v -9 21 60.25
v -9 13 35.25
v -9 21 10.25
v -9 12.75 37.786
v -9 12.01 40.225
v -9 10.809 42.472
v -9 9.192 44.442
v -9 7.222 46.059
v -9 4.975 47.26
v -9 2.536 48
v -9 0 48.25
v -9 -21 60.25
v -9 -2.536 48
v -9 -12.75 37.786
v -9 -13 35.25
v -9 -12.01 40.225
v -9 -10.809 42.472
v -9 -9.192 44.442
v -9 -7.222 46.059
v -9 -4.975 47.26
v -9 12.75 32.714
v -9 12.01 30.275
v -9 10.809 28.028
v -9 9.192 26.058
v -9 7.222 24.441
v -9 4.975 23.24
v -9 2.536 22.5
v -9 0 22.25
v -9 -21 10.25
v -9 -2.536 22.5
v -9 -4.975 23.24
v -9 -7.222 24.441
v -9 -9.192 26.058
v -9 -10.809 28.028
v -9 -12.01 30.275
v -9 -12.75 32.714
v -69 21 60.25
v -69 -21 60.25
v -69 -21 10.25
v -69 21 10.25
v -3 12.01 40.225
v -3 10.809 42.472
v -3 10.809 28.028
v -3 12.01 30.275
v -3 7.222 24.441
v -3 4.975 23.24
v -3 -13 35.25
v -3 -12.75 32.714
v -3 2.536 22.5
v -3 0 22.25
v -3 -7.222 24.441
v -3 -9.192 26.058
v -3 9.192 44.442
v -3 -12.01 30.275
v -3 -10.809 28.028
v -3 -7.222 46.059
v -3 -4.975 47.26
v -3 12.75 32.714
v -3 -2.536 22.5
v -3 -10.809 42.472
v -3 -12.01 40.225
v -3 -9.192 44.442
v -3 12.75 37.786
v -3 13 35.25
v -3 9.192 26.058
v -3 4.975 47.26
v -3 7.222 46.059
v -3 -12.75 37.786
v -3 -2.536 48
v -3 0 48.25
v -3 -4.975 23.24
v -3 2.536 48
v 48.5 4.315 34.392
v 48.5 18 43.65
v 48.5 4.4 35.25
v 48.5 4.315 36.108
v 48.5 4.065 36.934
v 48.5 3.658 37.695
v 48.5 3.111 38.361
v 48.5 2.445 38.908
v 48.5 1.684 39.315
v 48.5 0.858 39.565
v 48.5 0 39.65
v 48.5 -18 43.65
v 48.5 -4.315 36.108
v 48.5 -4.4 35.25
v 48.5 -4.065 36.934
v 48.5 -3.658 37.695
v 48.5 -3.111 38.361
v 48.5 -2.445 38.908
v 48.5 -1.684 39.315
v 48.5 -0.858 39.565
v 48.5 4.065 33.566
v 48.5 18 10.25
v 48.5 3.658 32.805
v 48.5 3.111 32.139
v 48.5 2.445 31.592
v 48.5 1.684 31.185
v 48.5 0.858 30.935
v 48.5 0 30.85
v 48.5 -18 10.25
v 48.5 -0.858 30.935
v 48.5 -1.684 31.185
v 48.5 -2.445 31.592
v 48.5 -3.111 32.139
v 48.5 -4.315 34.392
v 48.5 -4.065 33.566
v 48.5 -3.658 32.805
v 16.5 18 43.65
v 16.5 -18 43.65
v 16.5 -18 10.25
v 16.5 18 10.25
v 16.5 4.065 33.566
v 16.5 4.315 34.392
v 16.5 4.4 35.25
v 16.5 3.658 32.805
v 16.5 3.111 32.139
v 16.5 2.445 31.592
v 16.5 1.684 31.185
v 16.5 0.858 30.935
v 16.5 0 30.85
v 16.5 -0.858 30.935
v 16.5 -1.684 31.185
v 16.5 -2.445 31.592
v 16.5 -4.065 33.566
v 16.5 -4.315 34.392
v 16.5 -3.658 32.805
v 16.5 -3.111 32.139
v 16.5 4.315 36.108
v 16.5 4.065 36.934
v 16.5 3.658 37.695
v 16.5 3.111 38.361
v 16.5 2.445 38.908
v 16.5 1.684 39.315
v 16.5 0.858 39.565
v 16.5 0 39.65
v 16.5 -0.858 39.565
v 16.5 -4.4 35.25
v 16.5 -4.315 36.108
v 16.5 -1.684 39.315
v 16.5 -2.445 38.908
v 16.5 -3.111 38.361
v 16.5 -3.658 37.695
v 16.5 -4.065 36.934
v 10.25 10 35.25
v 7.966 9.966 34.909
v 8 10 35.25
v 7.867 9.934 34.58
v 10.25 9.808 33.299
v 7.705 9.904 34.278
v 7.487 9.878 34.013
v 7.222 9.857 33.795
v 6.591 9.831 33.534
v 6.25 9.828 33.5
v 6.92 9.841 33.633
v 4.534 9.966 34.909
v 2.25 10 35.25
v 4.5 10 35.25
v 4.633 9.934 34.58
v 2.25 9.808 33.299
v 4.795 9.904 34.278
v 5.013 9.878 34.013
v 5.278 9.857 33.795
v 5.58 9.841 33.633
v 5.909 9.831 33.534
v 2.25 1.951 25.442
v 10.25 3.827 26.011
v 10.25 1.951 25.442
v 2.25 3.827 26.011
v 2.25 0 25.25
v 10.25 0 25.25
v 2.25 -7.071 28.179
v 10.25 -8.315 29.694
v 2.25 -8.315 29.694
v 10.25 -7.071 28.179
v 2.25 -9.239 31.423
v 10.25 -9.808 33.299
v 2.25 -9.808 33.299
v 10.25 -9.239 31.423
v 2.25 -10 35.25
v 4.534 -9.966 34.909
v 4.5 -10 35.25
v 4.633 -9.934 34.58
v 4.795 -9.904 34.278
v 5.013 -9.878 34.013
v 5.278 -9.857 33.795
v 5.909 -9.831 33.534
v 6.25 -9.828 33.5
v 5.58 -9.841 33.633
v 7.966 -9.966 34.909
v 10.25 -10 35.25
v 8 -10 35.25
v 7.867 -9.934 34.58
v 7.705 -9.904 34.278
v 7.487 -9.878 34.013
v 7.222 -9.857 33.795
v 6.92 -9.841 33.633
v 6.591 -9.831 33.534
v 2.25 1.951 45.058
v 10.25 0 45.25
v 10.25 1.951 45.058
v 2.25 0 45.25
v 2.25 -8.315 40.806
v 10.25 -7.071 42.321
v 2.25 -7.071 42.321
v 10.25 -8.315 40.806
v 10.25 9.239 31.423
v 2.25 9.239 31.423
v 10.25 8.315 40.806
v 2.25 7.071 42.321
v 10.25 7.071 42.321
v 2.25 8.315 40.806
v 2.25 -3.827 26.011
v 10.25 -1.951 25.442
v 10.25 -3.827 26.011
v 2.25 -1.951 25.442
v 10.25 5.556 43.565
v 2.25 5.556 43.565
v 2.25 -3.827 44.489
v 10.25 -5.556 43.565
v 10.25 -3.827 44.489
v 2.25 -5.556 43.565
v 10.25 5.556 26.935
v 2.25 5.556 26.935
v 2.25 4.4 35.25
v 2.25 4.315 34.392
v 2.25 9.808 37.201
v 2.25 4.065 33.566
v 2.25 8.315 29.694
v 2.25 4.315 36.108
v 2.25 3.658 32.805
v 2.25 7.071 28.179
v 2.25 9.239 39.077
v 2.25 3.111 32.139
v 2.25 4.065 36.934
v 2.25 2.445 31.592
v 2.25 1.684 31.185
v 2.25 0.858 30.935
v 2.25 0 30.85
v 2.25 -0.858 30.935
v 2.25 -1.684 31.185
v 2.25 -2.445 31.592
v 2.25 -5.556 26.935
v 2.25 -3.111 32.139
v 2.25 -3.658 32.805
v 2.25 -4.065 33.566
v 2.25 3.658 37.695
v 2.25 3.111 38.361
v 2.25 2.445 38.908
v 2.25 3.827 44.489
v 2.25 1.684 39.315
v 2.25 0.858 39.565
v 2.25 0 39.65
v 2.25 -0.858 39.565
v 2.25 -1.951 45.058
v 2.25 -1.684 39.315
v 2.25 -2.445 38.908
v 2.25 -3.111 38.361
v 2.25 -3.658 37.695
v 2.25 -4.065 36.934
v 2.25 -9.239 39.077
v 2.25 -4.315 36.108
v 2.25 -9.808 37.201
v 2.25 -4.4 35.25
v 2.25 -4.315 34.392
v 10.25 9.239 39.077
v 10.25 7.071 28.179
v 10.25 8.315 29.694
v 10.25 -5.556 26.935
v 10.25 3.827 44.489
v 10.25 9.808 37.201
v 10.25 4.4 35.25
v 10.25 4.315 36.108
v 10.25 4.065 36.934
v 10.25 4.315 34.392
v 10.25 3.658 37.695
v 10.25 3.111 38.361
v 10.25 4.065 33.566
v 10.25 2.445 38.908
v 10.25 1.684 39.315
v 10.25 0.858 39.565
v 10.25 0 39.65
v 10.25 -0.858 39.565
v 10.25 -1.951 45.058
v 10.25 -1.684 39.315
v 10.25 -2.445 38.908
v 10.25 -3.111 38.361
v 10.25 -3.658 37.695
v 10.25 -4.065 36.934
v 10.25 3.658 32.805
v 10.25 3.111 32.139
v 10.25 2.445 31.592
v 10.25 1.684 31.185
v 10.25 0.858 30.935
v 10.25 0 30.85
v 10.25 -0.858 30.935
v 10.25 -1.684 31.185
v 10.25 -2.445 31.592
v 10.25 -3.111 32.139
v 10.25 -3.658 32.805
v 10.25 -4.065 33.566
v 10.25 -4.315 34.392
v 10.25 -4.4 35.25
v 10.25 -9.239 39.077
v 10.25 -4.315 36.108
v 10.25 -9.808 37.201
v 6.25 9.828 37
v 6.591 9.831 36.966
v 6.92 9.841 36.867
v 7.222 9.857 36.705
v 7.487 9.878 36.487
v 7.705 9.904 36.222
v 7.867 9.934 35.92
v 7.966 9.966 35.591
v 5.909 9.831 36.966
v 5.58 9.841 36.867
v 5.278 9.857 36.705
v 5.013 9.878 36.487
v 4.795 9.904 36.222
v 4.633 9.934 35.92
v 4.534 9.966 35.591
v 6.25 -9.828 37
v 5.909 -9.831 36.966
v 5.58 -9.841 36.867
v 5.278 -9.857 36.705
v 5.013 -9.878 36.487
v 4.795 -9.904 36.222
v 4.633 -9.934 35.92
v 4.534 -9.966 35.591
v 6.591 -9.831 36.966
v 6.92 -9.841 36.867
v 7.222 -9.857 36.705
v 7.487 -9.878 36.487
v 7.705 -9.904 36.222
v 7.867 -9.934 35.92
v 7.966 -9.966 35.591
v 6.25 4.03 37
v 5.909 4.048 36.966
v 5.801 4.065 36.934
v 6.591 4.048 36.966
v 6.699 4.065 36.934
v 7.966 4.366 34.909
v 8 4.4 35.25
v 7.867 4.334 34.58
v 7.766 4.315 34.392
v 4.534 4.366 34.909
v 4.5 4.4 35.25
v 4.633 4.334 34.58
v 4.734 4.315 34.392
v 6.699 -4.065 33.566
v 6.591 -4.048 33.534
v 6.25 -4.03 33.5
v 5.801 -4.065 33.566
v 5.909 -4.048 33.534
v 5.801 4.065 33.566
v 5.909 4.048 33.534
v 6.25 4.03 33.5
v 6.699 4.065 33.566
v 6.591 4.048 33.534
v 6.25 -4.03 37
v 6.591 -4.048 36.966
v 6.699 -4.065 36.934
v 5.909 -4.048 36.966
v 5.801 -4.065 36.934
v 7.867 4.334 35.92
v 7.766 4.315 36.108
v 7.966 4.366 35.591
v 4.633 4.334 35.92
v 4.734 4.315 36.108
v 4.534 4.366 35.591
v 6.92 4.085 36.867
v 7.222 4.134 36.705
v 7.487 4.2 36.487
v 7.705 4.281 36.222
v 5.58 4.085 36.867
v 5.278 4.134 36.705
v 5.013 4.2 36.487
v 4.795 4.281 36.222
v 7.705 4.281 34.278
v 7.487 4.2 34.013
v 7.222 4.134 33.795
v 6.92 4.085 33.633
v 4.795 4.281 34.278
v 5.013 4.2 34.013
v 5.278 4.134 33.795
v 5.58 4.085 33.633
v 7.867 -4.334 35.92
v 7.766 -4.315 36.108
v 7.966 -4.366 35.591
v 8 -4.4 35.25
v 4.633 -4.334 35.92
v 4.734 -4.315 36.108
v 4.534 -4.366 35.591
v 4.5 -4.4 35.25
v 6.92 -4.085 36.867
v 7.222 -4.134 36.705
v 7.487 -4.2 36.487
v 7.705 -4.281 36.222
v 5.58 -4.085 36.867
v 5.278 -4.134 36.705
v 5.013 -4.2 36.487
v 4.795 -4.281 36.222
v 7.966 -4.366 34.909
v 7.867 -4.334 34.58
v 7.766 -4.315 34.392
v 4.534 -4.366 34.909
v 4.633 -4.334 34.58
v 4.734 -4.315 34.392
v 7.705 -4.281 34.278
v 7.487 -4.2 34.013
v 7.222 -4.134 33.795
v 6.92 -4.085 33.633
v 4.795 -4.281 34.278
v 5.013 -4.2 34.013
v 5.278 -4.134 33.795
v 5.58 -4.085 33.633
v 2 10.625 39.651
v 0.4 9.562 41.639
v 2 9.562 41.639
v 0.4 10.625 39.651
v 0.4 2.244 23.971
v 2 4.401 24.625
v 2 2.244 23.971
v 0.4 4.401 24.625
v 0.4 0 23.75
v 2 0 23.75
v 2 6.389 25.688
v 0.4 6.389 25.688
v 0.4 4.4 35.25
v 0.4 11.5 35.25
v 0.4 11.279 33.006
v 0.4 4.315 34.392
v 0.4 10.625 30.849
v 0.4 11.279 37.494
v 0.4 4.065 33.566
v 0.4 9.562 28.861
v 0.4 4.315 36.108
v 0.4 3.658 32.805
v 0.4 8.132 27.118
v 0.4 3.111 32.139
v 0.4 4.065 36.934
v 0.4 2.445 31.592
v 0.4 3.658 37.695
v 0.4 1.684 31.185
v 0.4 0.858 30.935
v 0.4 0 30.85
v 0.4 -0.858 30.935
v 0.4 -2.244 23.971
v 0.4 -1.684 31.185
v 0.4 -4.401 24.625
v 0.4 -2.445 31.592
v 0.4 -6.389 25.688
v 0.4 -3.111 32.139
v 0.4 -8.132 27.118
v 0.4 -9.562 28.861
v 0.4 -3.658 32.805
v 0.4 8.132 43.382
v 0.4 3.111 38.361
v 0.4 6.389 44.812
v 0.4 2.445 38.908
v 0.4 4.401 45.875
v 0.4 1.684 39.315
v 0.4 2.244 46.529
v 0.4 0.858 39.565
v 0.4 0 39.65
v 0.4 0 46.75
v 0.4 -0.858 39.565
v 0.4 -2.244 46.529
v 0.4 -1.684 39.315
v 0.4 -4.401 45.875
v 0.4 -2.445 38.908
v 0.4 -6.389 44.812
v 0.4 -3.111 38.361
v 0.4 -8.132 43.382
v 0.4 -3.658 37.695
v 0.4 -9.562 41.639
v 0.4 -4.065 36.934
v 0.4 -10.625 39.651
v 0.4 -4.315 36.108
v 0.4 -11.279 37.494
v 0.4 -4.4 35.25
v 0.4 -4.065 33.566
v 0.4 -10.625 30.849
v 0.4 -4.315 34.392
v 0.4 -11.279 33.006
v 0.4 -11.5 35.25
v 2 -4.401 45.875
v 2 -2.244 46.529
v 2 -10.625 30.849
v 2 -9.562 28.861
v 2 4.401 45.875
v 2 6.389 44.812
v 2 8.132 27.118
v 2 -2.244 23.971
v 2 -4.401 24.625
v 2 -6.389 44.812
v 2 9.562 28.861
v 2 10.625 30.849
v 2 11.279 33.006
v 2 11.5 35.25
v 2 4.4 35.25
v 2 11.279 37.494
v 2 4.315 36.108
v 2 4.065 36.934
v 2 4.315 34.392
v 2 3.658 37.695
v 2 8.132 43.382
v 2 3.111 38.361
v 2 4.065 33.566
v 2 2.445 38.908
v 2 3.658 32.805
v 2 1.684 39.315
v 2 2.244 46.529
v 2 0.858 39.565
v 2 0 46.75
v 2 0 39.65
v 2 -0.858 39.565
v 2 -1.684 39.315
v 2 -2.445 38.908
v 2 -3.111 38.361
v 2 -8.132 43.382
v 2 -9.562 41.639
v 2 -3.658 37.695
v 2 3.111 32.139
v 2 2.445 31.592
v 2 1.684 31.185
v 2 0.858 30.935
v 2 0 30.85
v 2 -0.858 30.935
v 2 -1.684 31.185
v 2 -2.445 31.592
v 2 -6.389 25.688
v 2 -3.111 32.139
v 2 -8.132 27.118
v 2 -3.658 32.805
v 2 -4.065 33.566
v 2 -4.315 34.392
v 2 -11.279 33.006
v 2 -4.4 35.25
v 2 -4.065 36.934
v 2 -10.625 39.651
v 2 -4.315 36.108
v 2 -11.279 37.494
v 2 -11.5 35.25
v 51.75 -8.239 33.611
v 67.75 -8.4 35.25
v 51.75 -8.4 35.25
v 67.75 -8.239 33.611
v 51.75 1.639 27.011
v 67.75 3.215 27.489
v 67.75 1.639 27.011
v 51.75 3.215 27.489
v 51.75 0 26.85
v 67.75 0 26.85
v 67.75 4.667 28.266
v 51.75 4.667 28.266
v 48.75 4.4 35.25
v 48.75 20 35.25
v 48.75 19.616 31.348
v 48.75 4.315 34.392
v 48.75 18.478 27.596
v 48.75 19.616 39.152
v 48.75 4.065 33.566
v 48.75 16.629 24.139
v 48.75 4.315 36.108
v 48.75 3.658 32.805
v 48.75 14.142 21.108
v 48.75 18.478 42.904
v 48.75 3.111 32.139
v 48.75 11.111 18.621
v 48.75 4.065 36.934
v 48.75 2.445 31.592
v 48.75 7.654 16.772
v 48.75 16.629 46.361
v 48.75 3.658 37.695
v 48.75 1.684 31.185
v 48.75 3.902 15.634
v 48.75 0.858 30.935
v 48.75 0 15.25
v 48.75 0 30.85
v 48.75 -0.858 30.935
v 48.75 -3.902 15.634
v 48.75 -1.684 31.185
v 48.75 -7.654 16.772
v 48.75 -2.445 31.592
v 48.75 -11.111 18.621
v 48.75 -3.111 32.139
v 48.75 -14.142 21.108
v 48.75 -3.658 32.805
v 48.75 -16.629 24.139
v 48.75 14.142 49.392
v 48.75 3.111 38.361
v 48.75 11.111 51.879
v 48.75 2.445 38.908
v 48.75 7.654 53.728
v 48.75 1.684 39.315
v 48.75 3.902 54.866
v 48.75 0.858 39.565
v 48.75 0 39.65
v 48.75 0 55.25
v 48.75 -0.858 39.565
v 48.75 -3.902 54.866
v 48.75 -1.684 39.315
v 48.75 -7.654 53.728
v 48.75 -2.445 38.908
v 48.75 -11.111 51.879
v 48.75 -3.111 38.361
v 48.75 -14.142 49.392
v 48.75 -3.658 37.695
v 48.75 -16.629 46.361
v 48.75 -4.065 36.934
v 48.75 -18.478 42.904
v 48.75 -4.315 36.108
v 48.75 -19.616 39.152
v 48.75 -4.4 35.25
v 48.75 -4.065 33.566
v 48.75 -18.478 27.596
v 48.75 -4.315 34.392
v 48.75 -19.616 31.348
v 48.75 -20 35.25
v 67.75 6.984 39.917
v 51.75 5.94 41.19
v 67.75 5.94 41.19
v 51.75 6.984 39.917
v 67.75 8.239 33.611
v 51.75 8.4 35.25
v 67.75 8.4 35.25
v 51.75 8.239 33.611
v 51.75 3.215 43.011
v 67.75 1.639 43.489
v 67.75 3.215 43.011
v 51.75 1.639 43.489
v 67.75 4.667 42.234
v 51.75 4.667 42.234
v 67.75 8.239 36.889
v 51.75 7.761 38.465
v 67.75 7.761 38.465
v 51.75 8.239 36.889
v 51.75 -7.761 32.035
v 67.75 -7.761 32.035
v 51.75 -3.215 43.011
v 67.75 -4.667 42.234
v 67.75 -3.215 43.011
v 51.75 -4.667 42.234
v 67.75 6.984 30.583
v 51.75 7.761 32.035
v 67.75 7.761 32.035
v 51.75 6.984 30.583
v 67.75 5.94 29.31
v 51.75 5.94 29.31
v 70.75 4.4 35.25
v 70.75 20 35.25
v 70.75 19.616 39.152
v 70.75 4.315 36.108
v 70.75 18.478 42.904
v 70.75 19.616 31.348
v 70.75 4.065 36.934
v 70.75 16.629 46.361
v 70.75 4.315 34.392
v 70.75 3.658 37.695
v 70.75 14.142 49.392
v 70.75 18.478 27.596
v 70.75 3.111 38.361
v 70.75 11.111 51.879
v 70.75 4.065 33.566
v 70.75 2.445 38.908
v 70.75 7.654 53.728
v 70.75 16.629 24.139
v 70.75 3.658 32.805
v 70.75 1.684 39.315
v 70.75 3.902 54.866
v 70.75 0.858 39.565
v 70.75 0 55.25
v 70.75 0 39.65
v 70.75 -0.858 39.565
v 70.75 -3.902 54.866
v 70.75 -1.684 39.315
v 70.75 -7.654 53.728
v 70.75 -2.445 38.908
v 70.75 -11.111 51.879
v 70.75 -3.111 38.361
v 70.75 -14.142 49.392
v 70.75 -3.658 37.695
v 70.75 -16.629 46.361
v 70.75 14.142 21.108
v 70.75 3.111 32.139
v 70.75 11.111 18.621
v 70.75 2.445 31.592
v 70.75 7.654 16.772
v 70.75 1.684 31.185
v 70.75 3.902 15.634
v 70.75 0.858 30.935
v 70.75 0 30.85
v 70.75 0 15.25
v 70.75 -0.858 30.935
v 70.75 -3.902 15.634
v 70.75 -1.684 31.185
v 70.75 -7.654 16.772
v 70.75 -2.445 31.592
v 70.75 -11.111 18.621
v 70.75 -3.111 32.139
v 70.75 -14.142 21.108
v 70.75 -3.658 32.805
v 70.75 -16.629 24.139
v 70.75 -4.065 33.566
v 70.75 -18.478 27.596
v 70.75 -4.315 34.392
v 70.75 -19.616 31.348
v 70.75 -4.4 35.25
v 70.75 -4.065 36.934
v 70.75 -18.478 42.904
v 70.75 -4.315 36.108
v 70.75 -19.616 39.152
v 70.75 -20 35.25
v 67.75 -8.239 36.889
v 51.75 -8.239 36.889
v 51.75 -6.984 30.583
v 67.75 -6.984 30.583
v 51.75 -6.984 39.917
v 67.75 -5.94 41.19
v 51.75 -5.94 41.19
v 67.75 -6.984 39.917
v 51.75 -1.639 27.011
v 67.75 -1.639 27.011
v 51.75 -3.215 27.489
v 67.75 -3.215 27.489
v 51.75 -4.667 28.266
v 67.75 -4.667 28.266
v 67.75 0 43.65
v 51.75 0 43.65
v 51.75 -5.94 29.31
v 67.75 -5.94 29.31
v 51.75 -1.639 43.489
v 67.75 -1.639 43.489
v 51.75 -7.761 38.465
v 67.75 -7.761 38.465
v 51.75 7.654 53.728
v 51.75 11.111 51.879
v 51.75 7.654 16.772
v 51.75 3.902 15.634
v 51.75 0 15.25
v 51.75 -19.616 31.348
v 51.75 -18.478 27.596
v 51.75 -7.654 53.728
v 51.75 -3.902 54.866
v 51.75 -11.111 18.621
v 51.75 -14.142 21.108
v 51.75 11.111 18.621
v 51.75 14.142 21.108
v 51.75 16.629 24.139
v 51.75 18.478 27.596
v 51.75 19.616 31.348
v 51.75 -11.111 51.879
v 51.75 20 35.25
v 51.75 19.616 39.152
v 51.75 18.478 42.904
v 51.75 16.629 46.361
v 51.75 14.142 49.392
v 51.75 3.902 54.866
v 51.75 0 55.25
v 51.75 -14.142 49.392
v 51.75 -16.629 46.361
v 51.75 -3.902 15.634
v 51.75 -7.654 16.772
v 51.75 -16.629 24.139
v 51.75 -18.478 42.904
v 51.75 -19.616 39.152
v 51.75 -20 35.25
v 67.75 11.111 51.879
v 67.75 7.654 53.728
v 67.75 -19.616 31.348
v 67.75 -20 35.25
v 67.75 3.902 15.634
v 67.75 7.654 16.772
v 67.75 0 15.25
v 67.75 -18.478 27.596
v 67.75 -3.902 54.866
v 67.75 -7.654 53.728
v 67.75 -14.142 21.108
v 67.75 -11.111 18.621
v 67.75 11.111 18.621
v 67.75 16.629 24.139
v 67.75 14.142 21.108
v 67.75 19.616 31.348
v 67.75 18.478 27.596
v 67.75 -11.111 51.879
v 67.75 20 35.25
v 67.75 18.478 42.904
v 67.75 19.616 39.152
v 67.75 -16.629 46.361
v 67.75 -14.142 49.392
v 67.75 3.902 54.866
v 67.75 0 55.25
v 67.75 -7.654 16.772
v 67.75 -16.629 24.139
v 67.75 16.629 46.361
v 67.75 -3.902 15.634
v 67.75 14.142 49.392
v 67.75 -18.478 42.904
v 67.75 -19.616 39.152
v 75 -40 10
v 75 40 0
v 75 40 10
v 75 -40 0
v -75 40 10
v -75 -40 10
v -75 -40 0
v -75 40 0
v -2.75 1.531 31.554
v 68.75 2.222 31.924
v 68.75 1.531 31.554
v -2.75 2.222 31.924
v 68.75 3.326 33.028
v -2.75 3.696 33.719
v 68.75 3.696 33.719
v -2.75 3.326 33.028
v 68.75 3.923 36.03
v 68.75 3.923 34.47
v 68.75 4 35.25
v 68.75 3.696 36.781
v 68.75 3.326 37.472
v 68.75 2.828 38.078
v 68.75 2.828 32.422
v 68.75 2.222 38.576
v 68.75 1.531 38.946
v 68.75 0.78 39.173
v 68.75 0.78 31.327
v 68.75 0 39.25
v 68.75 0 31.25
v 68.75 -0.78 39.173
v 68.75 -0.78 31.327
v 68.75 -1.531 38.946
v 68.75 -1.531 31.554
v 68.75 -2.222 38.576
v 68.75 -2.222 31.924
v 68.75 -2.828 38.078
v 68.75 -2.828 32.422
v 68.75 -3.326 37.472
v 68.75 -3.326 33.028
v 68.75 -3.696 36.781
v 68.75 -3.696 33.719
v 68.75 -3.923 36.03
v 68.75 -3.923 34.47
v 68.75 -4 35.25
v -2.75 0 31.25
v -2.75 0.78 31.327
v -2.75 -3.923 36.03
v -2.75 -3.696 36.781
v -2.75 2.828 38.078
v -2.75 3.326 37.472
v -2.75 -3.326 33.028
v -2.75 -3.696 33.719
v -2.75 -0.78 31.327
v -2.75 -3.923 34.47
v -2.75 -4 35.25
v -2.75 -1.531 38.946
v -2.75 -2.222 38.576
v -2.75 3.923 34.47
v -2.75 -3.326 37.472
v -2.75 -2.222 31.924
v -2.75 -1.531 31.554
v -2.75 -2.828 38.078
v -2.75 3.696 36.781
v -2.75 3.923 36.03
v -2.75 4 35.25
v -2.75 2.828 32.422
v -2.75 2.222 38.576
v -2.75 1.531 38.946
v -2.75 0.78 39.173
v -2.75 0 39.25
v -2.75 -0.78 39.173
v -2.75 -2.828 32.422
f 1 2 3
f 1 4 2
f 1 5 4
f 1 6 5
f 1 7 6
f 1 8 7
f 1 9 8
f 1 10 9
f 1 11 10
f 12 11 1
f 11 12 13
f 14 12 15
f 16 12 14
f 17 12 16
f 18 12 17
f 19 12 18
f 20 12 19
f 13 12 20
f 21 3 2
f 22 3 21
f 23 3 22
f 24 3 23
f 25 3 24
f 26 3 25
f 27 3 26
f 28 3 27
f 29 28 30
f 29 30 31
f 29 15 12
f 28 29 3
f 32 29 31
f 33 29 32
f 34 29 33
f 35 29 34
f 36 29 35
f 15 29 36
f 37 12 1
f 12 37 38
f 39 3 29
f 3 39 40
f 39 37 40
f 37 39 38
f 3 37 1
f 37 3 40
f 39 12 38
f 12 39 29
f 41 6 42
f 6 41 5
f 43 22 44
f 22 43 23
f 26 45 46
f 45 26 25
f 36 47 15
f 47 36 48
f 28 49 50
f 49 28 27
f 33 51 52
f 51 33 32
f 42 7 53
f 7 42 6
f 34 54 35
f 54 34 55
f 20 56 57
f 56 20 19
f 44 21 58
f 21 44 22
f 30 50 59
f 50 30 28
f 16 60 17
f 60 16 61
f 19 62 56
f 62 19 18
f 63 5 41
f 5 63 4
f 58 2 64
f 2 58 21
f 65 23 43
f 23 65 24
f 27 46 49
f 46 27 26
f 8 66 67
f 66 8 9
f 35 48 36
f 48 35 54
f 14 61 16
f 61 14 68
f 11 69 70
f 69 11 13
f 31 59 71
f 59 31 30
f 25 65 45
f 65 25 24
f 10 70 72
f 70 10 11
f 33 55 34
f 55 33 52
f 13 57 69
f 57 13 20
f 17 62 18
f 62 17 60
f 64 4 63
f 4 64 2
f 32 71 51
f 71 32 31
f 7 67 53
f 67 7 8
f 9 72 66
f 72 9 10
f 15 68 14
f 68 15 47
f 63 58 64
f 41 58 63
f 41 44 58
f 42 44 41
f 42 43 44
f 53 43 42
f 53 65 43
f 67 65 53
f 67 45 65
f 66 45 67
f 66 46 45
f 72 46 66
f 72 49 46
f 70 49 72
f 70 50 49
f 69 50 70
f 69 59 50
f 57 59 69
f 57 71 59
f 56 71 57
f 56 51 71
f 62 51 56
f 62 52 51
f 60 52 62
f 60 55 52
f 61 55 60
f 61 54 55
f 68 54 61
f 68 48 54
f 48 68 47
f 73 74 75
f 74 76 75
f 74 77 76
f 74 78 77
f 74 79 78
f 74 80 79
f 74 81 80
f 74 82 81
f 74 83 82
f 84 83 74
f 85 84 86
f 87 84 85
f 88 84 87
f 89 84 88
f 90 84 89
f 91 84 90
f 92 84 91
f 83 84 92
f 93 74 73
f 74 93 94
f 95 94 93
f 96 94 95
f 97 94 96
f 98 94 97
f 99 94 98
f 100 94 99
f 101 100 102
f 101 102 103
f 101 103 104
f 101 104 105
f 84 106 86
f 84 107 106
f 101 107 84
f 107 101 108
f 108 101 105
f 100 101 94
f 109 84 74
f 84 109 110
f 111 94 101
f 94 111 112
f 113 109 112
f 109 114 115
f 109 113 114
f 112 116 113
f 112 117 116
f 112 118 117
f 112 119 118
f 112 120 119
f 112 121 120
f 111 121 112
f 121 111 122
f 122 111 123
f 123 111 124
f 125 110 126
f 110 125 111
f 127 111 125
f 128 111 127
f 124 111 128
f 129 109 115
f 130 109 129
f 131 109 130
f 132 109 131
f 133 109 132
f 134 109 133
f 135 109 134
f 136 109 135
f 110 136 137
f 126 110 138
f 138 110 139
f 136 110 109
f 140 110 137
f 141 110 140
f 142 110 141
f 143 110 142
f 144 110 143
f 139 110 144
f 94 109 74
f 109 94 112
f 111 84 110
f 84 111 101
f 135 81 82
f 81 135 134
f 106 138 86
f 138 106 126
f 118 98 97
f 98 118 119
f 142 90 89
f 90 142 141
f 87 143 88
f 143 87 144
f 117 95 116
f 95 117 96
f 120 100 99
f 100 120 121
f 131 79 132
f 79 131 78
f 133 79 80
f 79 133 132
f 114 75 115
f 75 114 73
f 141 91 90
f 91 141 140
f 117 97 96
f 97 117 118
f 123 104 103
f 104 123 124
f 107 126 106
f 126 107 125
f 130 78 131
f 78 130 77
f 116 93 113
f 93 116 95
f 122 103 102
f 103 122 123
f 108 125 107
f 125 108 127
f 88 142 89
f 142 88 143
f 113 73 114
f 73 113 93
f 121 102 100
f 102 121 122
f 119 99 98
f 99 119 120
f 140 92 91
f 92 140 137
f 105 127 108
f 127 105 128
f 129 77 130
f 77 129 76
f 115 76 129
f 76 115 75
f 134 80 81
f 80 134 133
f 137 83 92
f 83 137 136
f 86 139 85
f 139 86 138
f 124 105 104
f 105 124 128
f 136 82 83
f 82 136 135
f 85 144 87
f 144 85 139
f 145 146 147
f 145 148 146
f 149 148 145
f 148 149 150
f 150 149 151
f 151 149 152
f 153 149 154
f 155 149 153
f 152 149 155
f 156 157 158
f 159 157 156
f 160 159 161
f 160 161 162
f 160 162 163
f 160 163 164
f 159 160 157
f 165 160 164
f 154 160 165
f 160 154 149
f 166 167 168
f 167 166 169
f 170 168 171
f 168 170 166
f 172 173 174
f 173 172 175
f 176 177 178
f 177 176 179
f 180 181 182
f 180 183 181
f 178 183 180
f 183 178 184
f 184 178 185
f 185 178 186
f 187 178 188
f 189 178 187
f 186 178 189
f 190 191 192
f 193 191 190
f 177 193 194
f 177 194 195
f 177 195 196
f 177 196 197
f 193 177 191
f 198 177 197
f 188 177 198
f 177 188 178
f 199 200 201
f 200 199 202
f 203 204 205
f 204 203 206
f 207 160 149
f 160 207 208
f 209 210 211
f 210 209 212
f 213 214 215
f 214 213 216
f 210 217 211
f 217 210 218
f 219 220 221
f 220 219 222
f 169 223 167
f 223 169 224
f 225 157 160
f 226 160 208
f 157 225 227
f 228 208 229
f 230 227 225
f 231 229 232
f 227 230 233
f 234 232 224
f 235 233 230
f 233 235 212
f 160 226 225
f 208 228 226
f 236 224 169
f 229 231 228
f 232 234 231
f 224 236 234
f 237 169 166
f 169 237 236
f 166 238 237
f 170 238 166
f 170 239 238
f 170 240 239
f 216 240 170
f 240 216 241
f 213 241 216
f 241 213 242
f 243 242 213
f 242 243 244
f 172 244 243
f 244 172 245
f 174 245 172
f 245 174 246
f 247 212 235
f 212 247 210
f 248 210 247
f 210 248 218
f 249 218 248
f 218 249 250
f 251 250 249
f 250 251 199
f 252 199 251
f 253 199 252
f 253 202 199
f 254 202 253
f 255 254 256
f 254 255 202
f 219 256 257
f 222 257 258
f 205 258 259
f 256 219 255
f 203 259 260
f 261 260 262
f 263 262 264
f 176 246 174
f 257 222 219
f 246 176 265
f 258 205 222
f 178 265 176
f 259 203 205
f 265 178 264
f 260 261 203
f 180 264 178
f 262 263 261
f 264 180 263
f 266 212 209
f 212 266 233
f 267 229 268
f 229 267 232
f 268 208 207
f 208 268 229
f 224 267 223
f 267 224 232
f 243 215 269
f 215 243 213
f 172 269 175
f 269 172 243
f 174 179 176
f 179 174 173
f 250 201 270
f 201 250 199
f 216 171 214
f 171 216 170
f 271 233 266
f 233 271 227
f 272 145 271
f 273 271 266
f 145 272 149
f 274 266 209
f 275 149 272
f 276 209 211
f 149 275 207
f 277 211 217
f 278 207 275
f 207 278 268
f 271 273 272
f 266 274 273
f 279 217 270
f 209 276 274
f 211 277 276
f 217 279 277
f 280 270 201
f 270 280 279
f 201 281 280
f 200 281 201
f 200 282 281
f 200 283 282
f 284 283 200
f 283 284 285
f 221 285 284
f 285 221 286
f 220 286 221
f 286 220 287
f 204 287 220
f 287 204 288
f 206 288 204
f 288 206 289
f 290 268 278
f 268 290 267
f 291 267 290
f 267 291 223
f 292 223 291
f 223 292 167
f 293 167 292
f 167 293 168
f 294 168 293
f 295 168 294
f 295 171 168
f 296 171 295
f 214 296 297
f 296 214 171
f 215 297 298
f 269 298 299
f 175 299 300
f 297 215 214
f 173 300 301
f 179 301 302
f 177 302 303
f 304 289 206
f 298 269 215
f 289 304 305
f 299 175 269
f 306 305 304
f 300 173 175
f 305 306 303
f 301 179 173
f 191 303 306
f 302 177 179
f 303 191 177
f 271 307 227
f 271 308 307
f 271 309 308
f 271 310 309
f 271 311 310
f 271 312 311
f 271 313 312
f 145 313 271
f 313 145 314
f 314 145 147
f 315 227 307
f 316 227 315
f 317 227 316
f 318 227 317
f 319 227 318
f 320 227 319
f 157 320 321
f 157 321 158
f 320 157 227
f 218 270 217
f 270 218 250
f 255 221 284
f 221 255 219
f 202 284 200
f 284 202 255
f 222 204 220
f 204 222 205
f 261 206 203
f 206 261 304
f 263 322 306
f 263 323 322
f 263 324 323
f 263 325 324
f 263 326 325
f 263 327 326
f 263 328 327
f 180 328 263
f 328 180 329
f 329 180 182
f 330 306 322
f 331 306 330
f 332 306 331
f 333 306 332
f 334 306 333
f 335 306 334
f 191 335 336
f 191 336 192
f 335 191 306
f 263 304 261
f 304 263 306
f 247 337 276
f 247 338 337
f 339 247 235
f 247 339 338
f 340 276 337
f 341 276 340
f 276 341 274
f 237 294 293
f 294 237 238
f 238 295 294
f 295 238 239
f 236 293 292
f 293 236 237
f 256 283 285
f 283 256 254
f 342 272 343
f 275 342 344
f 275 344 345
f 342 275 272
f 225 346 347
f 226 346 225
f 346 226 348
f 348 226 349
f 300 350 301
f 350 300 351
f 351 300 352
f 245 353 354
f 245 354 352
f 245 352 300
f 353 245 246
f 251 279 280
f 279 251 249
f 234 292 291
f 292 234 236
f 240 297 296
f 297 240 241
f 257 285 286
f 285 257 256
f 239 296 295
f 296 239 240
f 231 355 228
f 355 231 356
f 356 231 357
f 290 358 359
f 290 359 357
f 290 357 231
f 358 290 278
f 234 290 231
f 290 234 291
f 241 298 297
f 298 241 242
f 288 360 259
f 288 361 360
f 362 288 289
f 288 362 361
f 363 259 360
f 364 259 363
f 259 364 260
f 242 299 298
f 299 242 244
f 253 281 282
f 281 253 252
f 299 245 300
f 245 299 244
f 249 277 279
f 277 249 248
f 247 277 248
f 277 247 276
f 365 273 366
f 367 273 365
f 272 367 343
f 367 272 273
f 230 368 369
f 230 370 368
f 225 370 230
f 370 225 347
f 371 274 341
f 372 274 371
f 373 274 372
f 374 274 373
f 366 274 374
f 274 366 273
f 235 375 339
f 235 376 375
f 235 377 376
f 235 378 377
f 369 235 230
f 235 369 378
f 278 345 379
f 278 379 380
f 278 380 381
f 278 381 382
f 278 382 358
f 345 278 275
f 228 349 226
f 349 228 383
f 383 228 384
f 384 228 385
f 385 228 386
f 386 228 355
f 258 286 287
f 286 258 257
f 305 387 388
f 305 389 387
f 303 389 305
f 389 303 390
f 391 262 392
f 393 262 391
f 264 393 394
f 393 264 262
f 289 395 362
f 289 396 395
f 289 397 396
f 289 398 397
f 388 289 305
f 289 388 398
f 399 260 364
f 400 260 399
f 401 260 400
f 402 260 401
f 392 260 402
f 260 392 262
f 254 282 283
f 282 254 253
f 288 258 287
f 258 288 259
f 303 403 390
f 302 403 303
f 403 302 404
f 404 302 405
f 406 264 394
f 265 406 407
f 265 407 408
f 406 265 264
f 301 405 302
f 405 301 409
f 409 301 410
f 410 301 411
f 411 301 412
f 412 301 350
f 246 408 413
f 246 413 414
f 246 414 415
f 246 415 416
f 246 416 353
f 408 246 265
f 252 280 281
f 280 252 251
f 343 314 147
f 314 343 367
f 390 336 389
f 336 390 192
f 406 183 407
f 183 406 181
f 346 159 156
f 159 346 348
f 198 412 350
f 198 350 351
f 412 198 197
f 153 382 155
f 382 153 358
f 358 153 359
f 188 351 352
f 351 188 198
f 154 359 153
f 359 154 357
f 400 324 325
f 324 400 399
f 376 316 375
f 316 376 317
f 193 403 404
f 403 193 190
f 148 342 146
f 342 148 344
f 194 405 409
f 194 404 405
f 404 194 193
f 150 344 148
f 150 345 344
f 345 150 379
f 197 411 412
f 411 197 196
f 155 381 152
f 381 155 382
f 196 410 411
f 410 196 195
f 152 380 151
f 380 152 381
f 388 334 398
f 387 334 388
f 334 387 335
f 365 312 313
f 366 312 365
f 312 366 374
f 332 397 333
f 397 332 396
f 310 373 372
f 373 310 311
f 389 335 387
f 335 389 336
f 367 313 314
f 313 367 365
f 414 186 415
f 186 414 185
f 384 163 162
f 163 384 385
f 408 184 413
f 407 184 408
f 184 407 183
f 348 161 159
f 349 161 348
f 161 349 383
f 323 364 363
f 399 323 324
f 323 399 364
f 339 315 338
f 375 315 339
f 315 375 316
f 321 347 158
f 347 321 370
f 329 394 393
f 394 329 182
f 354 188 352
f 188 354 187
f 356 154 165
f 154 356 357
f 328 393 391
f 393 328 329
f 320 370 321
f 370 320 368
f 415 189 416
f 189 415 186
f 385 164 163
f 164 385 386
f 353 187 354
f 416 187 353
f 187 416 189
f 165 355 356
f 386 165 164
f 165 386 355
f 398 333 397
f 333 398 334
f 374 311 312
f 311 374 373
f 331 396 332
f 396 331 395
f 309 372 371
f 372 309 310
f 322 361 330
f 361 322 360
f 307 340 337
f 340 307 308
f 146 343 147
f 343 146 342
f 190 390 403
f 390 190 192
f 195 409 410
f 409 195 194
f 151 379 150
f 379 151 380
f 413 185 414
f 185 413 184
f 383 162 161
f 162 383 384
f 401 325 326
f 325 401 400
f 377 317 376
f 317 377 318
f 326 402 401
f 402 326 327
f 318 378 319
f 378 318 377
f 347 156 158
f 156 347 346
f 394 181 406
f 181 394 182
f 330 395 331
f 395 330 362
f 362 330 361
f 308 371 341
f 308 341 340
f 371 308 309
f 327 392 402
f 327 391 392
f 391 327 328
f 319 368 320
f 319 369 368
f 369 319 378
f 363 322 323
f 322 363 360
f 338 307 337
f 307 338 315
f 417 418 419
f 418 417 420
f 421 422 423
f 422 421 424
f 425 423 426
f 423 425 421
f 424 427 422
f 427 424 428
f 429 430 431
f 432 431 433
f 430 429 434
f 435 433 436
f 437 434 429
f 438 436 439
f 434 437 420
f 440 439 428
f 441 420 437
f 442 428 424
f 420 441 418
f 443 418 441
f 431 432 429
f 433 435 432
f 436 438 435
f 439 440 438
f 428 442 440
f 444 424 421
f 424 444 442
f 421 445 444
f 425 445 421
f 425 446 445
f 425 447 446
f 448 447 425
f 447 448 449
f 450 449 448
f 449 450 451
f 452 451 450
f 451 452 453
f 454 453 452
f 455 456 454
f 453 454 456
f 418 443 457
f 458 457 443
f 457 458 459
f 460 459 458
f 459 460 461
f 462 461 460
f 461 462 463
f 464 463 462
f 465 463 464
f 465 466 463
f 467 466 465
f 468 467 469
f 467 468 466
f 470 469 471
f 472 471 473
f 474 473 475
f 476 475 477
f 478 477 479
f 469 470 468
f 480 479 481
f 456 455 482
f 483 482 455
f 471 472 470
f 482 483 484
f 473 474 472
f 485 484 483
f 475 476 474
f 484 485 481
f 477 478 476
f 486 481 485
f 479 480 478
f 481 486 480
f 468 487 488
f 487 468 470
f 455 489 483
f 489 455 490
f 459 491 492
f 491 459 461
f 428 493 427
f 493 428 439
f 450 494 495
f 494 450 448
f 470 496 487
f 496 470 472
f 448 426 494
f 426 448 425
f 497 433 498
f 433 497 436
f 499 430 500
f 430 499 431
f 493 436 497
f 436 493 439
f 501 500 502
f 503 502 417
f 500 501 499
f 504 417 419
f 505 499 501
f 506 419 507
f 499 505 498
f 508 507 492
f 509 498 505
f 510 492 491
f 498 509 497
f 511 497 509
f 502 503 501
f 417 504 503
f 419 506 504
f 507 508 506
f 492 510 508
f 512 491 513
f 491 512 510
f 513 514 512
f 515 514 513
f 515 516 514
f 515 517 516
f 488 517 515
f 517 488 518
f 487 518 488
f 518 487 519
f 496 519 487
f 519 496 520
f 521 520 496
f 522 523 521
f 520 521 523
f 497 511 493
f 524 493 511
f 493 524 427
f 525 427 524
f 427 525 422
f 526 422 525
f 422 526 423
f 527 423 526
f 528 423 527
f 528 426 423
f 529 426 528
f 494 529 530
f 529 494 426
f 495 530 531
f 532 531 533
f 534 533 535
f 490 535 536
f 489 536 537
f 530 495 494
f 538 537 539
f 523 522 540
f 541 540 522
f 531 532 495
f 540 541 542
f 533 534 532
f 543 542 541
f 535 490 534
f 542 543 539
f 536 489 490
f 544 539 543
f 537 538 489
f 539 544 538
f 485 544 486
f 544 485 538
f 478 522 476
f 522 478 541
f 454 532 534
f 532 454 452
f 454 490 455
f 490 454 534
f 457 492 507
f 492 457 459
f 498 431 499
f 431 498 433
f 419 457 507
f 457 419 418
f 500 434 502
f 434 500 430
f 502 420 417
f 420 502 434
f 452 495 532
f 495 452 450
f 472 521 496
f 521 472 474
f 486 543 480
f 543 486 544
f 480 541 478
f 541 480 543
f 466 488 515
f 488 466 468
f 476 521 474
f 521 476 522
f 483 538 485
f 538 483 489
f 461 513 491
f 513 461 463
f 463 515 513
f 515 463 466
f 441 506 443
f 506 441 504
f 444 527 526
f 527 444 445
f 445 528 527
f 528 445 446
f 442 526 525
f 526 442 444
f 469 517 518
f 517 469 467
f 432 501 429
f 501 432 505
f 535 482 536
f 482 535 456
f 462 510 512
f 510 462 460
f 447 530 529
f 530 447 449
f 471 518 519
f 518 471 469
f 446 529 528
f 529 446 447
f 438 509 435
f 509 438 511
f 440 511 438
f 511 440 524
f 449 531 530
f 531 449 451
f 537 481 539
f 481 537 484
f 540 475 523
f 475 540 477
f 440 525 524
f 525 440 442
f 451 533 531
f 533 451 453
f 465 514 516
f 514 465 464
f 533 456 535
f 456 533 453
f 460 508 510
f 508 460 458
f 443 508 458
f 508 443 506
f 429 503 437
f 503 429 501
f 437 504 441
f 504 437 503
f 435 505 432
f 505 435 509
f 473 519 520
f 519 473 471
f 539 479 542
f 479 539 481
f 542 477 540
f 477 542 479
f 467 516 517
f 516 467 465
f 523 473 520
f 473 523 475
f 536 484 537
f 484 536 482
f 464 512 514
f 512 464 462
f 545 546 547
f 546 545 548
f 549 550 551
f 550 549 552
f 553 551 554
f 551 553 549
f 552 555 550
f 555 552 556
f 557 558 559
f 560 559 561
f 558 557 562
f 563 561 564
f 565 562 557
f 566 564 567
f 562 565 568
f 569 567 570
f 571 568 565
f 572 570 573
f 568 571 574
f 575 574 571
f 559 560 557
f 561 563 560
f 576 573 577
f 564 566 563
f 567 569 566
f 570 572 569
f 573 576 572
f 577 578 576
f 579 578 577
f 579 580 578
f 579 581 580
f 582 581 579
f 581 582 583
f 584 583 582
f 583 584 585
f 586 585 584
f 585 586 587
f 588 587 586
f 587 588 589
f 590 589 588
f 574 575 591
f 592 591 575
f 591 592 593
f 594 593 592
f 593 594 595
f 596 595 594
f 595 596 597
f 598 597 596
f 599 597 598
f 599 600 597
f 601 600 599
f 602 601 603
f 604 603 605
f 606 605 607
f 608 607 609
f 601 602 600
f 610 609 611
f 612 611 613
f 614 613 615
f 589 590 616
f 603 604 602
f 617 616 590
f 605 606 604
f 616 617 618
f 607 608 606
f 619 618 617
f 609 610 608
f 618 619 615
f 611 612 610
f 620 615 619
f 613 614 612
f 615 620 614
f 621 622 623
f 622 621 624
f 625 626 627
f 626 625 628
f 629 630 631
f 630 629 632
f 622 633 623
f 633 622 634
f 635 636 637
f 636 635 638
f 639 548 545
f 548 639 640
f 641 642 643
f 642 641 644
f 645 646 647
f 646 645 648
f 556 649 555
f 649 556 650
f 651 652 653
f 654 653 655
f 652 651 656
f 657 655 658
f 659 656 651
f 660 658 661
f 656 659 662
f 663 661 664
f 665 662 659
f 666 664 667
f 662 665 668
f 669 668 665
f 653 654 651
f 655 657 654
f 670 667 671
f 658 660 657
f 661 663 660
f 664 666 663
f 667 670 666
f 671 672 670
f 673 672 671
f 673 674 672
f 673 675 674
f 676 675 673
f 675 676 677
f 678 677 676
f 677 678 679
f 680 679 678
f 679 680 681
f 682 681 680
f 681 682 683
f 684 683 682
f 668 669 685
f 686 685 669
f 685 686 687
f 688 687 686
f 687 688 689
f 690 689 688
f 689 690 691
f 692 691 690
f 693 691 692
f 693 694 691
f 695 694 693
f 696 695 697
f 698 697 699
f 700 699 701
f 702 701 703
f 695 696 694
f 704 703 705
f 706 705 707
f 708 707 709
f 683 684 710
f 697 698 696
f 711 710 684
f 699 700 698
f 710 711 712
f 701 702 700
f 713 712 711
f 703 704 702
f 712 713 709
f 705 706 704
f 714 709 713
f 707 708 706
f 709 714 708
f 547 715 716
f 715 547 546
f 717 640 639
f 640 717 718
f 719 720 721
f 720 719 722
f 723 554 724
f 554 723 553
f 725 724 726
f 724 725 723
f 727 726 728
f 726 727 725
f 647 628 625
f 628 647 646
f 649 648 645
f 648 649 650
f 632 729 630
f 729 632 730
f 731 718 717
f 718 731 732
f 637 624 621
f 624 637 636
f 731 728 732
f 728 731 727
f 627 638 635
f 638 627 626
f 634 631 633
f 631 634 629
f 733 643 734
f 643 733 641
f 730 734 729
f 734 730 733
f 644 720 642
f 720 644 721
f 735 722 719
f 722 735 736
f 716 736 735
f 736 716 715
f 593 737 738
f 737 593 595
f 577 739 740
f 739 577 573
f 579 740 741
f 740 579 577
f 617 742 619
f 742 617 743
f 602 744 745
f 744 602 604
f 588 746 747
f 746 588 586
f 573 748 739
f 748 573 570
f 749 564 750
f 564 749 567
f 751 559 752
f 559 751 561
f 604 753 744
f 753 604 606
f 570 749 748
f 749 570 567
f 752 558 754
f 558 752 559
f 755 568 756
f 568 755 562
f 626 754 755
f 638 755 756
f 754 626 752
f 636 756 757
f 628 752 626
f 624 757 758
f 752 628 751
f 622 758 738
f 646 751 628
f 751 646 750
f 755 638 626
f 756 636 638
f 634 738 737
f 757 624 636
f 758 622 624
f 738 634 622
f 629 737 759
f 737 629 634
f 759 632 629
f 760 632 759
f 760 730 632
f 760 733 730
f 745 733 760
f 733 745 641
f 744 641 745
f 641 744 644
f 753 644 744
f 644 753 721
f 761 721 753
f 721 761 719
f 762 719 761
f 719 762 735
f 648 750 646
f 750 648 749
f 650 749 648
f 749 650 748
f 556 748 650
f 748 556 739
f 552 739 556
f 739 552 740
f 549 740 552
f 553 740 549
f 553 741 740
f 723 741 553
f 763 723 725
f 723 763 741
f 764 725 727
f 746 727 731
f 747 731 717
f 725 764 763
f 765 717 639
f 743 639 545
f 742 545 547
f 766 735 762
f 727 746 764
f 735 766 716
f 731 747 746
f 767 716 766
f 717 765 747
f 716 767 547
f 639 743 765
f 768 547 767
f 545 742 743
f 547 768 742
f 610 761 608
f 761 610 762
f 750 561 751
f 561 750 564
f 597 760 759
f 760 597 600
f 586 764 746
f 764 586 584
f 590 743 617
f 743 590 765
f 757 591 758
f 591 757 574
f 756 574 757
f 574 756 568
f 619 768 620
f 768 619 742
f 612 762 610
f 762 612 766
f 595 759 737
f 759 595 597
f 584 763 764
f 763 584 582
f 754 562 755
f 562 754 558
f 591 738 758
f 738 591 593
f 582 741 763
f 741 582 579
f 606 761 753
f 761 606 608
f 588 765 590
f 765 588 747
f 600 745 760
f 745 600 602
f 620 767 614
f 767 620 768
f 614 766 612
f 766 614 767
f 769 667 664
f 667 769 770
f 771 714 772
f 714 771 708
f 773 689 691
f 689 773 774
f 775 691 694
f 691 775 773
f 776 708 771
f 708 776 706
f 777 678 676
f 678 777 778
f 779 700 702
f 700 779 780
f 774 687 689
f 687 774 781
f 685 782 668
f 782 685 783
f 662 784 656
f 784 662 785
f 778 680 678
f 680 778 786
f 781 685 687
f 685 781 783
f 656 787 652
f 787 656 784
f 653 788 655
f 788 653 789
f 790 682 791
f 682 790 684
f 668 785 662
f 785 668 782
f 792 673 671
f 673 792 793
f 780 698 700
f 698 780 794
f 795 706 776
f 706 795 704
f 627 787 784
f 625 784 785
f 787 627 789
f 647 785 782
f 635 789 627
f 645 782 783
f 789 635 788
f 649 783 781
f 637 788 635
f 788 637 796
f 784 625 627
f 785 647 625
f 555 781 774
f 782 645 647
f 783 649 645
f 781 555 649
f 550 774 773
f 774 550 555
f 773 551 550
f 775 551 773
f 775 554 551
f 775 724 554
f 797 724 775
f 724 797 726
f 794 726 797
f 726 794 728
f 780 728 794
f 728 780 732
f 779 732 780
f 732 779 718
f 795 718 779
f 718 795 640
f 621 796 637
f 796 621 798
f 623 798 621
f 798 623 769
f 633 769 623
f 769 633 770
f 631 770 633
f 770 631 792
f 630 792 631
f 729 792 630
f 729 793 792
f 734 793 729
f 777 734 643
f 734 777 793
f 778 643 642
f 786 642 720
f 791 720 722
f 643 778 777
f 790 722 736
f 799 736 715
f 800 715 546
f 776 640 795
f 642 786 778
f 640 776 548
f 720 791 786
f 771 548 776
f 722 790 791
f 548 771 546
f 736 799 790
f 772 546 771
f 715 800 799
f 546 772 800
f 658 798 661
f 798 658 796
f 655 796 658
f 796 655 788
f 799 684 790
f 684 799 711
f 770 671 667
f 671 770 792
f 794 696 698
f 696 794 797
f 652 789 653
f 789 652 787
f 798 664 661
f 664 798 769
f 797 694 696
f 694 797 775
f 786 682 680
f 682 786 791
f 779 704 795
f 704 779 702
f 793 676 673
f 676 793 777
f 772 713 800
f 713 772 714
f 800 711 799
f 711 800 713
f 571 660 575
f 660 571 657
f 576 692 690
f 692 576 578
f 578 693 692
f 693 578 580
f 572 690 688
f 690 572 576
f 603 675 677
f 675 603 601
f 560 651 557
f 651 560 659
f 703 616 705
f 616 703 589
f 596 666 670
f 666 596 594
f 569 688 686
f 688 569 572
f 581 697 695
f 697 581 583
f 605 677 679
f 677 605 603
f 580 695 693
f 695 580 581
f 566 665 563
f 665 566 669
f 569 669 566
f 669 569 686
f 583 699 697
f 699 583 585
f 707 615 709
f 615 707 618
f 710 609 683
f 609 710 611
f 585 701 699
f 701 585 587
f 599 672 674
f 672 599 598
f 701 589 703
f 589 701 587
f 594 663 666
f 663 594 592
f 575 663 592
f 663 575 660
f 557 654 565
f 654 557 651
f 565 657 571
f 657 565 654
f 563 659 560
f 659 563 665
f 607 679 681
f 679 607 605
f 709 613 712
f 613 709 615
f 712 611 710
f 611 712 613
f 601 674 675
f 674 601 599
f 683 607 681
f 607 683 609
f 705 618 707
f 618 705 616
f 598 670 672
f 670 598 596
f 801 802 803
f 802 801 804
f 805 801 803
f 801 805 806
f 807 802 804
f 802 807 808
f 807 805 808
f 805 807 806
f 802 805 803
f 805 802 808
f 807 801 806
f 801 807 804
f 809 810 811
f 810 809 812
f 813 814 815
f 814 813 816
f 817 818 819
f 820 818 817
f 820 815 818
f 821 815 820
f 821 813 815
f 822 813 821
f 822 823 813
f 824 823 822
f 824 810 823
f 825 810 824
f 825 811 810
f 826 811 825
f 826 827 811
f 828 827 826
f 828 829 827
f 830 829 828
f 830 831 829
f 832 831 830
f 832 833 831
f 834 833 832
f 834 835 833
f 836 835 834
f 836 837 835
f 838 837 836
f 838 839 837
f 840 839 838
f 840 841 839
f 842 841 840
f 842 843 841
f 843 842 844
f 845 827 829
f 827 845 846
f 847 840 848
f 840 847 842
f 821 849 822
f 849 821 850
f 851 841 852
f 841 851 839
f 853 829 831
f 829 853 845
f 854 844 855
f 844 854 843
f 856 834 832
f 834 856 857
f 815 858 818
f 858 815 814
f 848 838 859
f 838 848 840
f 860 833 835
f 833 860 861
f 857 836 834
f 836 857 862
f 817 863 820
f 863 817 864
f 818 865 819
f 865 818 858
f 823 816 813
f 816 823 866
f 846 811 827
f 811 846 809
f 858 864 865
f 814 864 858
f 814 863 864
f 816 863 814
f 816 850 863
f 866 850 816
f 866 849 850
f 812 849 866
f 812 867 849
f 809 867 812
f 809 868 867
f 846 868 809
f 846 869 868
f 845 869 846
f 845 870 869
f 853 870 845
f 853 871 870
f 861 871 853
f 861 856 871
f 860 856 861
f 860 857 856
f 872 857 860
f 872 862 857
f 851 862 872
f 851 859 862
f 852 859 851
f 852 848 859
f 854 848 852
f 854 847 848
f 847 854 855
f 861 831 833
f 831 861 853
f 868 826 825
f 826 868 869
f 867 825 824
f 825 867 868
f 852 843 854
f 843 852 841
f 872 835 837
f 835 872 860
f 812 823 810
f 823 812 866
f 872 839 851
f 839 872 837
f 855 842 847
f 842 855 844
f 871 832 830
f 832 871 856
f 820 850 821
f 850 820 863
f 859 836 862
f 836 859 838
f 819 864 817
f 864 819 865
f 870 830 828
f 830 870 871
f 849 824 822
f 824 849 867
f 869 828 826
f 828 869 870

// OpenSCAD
$fn = 32;

// ------------------------------------------------------------------------
// Motor drive station: motor 60 x 50 mm, shaft d8, pulley d40
// Every part is its own module, assembly() places every instance.
// ------------------------------------------------------------------------

// --- part 1 ---
module station_bed() {
  difference() {
    translate([-75, -40, 0]) cube([150, 80, 10]);
  }
}

// --- part 2 ---
module drive_motor() {
  union() {
    translate([-30, -21, 0]) cube([60, 42, 50]);
    translate([33, 0, 25]) rotate([0, 90, 0]) cylinder(h = 6, d = 26, center = true);
  }
}

// --- part 3 ---
module pillow_block() {
  difference() {
    translate([-16, -18, 0]) cube([32, 36, 33.4]);
    translate([0, 0, 25]) rotate([0, 90, 0]) cylinder(h = 34, d = 8.8, center = true);
  }
}

// --- part 4 ---
module drive_shaft() {
  translate([0, 0, -35.75]) cylinder(h = 71.5, d = 8);
}

// --- part 5 ---
module shaft_collar() {
  difference() {
    cylinder(h = 8, d = 20);
    translate([0, 0, -1]) cylinder(h = 10, d = 8.8);
    translate([0, 0, 4]) rotate([90, 0, 0]) cylinder(h = 22, d = 3.5, center = true);
  }
}

// --- part 6 ---
module collar_washer() {
  difference() {
      translate([0, 0, 0]) cylinder(h = 1.6, d = 23);
      translate([0, 0, -1]) cylinder(h = 3.6, d = 8.8);
    }
}

// --- part 7 ---
module drive_pulley() {
  difference() {
    union() {
      cylinder(h = 22, d = 16.8);
      cylinder(h = 3, d = 40);
      translate([0, 0, 19]) cylinder(h = 3, d = 40);
    }
    translate([0, 0, -1]) cylinder(h = 24, d = 8.8);
  }
}

// --- assembly ---
module assembly() {
  color([0.80, 0.24, 0.20]) translate([0, 0, 0]) rotate([0, 0, 0]) station_bed();
  color([0.20, 0.45, 0.75]) translate([-39, 0, 10.25]) rotate([0, 0, 0]) drive_motor();
  color([0.25, 0.62, 0.32]) translate([32.5, 0, 10.25]) rotate([0, 0, 0]) pillow_block();
  color([0.92, 0.70, 0.18]) translate([33, 0, 35.25]) rotate([0, 90, 0]) drive_shaft();
  color([0.58, 0.35, 0.70]) translate([2.25, 0, 35.25]) rotate([0, 90, 0]) shaft_collar();
  color([0.16, 0.66, 0.66]) translate([0.4, 0, 35.25]) rotate([0, 90, 0]) collar_washer();
  color([0.85, 0.48, 0.18]) translate([48.75, 0, 35.25]) rotate([0, 90, 0]) drive_pulley();
}

assembly();
